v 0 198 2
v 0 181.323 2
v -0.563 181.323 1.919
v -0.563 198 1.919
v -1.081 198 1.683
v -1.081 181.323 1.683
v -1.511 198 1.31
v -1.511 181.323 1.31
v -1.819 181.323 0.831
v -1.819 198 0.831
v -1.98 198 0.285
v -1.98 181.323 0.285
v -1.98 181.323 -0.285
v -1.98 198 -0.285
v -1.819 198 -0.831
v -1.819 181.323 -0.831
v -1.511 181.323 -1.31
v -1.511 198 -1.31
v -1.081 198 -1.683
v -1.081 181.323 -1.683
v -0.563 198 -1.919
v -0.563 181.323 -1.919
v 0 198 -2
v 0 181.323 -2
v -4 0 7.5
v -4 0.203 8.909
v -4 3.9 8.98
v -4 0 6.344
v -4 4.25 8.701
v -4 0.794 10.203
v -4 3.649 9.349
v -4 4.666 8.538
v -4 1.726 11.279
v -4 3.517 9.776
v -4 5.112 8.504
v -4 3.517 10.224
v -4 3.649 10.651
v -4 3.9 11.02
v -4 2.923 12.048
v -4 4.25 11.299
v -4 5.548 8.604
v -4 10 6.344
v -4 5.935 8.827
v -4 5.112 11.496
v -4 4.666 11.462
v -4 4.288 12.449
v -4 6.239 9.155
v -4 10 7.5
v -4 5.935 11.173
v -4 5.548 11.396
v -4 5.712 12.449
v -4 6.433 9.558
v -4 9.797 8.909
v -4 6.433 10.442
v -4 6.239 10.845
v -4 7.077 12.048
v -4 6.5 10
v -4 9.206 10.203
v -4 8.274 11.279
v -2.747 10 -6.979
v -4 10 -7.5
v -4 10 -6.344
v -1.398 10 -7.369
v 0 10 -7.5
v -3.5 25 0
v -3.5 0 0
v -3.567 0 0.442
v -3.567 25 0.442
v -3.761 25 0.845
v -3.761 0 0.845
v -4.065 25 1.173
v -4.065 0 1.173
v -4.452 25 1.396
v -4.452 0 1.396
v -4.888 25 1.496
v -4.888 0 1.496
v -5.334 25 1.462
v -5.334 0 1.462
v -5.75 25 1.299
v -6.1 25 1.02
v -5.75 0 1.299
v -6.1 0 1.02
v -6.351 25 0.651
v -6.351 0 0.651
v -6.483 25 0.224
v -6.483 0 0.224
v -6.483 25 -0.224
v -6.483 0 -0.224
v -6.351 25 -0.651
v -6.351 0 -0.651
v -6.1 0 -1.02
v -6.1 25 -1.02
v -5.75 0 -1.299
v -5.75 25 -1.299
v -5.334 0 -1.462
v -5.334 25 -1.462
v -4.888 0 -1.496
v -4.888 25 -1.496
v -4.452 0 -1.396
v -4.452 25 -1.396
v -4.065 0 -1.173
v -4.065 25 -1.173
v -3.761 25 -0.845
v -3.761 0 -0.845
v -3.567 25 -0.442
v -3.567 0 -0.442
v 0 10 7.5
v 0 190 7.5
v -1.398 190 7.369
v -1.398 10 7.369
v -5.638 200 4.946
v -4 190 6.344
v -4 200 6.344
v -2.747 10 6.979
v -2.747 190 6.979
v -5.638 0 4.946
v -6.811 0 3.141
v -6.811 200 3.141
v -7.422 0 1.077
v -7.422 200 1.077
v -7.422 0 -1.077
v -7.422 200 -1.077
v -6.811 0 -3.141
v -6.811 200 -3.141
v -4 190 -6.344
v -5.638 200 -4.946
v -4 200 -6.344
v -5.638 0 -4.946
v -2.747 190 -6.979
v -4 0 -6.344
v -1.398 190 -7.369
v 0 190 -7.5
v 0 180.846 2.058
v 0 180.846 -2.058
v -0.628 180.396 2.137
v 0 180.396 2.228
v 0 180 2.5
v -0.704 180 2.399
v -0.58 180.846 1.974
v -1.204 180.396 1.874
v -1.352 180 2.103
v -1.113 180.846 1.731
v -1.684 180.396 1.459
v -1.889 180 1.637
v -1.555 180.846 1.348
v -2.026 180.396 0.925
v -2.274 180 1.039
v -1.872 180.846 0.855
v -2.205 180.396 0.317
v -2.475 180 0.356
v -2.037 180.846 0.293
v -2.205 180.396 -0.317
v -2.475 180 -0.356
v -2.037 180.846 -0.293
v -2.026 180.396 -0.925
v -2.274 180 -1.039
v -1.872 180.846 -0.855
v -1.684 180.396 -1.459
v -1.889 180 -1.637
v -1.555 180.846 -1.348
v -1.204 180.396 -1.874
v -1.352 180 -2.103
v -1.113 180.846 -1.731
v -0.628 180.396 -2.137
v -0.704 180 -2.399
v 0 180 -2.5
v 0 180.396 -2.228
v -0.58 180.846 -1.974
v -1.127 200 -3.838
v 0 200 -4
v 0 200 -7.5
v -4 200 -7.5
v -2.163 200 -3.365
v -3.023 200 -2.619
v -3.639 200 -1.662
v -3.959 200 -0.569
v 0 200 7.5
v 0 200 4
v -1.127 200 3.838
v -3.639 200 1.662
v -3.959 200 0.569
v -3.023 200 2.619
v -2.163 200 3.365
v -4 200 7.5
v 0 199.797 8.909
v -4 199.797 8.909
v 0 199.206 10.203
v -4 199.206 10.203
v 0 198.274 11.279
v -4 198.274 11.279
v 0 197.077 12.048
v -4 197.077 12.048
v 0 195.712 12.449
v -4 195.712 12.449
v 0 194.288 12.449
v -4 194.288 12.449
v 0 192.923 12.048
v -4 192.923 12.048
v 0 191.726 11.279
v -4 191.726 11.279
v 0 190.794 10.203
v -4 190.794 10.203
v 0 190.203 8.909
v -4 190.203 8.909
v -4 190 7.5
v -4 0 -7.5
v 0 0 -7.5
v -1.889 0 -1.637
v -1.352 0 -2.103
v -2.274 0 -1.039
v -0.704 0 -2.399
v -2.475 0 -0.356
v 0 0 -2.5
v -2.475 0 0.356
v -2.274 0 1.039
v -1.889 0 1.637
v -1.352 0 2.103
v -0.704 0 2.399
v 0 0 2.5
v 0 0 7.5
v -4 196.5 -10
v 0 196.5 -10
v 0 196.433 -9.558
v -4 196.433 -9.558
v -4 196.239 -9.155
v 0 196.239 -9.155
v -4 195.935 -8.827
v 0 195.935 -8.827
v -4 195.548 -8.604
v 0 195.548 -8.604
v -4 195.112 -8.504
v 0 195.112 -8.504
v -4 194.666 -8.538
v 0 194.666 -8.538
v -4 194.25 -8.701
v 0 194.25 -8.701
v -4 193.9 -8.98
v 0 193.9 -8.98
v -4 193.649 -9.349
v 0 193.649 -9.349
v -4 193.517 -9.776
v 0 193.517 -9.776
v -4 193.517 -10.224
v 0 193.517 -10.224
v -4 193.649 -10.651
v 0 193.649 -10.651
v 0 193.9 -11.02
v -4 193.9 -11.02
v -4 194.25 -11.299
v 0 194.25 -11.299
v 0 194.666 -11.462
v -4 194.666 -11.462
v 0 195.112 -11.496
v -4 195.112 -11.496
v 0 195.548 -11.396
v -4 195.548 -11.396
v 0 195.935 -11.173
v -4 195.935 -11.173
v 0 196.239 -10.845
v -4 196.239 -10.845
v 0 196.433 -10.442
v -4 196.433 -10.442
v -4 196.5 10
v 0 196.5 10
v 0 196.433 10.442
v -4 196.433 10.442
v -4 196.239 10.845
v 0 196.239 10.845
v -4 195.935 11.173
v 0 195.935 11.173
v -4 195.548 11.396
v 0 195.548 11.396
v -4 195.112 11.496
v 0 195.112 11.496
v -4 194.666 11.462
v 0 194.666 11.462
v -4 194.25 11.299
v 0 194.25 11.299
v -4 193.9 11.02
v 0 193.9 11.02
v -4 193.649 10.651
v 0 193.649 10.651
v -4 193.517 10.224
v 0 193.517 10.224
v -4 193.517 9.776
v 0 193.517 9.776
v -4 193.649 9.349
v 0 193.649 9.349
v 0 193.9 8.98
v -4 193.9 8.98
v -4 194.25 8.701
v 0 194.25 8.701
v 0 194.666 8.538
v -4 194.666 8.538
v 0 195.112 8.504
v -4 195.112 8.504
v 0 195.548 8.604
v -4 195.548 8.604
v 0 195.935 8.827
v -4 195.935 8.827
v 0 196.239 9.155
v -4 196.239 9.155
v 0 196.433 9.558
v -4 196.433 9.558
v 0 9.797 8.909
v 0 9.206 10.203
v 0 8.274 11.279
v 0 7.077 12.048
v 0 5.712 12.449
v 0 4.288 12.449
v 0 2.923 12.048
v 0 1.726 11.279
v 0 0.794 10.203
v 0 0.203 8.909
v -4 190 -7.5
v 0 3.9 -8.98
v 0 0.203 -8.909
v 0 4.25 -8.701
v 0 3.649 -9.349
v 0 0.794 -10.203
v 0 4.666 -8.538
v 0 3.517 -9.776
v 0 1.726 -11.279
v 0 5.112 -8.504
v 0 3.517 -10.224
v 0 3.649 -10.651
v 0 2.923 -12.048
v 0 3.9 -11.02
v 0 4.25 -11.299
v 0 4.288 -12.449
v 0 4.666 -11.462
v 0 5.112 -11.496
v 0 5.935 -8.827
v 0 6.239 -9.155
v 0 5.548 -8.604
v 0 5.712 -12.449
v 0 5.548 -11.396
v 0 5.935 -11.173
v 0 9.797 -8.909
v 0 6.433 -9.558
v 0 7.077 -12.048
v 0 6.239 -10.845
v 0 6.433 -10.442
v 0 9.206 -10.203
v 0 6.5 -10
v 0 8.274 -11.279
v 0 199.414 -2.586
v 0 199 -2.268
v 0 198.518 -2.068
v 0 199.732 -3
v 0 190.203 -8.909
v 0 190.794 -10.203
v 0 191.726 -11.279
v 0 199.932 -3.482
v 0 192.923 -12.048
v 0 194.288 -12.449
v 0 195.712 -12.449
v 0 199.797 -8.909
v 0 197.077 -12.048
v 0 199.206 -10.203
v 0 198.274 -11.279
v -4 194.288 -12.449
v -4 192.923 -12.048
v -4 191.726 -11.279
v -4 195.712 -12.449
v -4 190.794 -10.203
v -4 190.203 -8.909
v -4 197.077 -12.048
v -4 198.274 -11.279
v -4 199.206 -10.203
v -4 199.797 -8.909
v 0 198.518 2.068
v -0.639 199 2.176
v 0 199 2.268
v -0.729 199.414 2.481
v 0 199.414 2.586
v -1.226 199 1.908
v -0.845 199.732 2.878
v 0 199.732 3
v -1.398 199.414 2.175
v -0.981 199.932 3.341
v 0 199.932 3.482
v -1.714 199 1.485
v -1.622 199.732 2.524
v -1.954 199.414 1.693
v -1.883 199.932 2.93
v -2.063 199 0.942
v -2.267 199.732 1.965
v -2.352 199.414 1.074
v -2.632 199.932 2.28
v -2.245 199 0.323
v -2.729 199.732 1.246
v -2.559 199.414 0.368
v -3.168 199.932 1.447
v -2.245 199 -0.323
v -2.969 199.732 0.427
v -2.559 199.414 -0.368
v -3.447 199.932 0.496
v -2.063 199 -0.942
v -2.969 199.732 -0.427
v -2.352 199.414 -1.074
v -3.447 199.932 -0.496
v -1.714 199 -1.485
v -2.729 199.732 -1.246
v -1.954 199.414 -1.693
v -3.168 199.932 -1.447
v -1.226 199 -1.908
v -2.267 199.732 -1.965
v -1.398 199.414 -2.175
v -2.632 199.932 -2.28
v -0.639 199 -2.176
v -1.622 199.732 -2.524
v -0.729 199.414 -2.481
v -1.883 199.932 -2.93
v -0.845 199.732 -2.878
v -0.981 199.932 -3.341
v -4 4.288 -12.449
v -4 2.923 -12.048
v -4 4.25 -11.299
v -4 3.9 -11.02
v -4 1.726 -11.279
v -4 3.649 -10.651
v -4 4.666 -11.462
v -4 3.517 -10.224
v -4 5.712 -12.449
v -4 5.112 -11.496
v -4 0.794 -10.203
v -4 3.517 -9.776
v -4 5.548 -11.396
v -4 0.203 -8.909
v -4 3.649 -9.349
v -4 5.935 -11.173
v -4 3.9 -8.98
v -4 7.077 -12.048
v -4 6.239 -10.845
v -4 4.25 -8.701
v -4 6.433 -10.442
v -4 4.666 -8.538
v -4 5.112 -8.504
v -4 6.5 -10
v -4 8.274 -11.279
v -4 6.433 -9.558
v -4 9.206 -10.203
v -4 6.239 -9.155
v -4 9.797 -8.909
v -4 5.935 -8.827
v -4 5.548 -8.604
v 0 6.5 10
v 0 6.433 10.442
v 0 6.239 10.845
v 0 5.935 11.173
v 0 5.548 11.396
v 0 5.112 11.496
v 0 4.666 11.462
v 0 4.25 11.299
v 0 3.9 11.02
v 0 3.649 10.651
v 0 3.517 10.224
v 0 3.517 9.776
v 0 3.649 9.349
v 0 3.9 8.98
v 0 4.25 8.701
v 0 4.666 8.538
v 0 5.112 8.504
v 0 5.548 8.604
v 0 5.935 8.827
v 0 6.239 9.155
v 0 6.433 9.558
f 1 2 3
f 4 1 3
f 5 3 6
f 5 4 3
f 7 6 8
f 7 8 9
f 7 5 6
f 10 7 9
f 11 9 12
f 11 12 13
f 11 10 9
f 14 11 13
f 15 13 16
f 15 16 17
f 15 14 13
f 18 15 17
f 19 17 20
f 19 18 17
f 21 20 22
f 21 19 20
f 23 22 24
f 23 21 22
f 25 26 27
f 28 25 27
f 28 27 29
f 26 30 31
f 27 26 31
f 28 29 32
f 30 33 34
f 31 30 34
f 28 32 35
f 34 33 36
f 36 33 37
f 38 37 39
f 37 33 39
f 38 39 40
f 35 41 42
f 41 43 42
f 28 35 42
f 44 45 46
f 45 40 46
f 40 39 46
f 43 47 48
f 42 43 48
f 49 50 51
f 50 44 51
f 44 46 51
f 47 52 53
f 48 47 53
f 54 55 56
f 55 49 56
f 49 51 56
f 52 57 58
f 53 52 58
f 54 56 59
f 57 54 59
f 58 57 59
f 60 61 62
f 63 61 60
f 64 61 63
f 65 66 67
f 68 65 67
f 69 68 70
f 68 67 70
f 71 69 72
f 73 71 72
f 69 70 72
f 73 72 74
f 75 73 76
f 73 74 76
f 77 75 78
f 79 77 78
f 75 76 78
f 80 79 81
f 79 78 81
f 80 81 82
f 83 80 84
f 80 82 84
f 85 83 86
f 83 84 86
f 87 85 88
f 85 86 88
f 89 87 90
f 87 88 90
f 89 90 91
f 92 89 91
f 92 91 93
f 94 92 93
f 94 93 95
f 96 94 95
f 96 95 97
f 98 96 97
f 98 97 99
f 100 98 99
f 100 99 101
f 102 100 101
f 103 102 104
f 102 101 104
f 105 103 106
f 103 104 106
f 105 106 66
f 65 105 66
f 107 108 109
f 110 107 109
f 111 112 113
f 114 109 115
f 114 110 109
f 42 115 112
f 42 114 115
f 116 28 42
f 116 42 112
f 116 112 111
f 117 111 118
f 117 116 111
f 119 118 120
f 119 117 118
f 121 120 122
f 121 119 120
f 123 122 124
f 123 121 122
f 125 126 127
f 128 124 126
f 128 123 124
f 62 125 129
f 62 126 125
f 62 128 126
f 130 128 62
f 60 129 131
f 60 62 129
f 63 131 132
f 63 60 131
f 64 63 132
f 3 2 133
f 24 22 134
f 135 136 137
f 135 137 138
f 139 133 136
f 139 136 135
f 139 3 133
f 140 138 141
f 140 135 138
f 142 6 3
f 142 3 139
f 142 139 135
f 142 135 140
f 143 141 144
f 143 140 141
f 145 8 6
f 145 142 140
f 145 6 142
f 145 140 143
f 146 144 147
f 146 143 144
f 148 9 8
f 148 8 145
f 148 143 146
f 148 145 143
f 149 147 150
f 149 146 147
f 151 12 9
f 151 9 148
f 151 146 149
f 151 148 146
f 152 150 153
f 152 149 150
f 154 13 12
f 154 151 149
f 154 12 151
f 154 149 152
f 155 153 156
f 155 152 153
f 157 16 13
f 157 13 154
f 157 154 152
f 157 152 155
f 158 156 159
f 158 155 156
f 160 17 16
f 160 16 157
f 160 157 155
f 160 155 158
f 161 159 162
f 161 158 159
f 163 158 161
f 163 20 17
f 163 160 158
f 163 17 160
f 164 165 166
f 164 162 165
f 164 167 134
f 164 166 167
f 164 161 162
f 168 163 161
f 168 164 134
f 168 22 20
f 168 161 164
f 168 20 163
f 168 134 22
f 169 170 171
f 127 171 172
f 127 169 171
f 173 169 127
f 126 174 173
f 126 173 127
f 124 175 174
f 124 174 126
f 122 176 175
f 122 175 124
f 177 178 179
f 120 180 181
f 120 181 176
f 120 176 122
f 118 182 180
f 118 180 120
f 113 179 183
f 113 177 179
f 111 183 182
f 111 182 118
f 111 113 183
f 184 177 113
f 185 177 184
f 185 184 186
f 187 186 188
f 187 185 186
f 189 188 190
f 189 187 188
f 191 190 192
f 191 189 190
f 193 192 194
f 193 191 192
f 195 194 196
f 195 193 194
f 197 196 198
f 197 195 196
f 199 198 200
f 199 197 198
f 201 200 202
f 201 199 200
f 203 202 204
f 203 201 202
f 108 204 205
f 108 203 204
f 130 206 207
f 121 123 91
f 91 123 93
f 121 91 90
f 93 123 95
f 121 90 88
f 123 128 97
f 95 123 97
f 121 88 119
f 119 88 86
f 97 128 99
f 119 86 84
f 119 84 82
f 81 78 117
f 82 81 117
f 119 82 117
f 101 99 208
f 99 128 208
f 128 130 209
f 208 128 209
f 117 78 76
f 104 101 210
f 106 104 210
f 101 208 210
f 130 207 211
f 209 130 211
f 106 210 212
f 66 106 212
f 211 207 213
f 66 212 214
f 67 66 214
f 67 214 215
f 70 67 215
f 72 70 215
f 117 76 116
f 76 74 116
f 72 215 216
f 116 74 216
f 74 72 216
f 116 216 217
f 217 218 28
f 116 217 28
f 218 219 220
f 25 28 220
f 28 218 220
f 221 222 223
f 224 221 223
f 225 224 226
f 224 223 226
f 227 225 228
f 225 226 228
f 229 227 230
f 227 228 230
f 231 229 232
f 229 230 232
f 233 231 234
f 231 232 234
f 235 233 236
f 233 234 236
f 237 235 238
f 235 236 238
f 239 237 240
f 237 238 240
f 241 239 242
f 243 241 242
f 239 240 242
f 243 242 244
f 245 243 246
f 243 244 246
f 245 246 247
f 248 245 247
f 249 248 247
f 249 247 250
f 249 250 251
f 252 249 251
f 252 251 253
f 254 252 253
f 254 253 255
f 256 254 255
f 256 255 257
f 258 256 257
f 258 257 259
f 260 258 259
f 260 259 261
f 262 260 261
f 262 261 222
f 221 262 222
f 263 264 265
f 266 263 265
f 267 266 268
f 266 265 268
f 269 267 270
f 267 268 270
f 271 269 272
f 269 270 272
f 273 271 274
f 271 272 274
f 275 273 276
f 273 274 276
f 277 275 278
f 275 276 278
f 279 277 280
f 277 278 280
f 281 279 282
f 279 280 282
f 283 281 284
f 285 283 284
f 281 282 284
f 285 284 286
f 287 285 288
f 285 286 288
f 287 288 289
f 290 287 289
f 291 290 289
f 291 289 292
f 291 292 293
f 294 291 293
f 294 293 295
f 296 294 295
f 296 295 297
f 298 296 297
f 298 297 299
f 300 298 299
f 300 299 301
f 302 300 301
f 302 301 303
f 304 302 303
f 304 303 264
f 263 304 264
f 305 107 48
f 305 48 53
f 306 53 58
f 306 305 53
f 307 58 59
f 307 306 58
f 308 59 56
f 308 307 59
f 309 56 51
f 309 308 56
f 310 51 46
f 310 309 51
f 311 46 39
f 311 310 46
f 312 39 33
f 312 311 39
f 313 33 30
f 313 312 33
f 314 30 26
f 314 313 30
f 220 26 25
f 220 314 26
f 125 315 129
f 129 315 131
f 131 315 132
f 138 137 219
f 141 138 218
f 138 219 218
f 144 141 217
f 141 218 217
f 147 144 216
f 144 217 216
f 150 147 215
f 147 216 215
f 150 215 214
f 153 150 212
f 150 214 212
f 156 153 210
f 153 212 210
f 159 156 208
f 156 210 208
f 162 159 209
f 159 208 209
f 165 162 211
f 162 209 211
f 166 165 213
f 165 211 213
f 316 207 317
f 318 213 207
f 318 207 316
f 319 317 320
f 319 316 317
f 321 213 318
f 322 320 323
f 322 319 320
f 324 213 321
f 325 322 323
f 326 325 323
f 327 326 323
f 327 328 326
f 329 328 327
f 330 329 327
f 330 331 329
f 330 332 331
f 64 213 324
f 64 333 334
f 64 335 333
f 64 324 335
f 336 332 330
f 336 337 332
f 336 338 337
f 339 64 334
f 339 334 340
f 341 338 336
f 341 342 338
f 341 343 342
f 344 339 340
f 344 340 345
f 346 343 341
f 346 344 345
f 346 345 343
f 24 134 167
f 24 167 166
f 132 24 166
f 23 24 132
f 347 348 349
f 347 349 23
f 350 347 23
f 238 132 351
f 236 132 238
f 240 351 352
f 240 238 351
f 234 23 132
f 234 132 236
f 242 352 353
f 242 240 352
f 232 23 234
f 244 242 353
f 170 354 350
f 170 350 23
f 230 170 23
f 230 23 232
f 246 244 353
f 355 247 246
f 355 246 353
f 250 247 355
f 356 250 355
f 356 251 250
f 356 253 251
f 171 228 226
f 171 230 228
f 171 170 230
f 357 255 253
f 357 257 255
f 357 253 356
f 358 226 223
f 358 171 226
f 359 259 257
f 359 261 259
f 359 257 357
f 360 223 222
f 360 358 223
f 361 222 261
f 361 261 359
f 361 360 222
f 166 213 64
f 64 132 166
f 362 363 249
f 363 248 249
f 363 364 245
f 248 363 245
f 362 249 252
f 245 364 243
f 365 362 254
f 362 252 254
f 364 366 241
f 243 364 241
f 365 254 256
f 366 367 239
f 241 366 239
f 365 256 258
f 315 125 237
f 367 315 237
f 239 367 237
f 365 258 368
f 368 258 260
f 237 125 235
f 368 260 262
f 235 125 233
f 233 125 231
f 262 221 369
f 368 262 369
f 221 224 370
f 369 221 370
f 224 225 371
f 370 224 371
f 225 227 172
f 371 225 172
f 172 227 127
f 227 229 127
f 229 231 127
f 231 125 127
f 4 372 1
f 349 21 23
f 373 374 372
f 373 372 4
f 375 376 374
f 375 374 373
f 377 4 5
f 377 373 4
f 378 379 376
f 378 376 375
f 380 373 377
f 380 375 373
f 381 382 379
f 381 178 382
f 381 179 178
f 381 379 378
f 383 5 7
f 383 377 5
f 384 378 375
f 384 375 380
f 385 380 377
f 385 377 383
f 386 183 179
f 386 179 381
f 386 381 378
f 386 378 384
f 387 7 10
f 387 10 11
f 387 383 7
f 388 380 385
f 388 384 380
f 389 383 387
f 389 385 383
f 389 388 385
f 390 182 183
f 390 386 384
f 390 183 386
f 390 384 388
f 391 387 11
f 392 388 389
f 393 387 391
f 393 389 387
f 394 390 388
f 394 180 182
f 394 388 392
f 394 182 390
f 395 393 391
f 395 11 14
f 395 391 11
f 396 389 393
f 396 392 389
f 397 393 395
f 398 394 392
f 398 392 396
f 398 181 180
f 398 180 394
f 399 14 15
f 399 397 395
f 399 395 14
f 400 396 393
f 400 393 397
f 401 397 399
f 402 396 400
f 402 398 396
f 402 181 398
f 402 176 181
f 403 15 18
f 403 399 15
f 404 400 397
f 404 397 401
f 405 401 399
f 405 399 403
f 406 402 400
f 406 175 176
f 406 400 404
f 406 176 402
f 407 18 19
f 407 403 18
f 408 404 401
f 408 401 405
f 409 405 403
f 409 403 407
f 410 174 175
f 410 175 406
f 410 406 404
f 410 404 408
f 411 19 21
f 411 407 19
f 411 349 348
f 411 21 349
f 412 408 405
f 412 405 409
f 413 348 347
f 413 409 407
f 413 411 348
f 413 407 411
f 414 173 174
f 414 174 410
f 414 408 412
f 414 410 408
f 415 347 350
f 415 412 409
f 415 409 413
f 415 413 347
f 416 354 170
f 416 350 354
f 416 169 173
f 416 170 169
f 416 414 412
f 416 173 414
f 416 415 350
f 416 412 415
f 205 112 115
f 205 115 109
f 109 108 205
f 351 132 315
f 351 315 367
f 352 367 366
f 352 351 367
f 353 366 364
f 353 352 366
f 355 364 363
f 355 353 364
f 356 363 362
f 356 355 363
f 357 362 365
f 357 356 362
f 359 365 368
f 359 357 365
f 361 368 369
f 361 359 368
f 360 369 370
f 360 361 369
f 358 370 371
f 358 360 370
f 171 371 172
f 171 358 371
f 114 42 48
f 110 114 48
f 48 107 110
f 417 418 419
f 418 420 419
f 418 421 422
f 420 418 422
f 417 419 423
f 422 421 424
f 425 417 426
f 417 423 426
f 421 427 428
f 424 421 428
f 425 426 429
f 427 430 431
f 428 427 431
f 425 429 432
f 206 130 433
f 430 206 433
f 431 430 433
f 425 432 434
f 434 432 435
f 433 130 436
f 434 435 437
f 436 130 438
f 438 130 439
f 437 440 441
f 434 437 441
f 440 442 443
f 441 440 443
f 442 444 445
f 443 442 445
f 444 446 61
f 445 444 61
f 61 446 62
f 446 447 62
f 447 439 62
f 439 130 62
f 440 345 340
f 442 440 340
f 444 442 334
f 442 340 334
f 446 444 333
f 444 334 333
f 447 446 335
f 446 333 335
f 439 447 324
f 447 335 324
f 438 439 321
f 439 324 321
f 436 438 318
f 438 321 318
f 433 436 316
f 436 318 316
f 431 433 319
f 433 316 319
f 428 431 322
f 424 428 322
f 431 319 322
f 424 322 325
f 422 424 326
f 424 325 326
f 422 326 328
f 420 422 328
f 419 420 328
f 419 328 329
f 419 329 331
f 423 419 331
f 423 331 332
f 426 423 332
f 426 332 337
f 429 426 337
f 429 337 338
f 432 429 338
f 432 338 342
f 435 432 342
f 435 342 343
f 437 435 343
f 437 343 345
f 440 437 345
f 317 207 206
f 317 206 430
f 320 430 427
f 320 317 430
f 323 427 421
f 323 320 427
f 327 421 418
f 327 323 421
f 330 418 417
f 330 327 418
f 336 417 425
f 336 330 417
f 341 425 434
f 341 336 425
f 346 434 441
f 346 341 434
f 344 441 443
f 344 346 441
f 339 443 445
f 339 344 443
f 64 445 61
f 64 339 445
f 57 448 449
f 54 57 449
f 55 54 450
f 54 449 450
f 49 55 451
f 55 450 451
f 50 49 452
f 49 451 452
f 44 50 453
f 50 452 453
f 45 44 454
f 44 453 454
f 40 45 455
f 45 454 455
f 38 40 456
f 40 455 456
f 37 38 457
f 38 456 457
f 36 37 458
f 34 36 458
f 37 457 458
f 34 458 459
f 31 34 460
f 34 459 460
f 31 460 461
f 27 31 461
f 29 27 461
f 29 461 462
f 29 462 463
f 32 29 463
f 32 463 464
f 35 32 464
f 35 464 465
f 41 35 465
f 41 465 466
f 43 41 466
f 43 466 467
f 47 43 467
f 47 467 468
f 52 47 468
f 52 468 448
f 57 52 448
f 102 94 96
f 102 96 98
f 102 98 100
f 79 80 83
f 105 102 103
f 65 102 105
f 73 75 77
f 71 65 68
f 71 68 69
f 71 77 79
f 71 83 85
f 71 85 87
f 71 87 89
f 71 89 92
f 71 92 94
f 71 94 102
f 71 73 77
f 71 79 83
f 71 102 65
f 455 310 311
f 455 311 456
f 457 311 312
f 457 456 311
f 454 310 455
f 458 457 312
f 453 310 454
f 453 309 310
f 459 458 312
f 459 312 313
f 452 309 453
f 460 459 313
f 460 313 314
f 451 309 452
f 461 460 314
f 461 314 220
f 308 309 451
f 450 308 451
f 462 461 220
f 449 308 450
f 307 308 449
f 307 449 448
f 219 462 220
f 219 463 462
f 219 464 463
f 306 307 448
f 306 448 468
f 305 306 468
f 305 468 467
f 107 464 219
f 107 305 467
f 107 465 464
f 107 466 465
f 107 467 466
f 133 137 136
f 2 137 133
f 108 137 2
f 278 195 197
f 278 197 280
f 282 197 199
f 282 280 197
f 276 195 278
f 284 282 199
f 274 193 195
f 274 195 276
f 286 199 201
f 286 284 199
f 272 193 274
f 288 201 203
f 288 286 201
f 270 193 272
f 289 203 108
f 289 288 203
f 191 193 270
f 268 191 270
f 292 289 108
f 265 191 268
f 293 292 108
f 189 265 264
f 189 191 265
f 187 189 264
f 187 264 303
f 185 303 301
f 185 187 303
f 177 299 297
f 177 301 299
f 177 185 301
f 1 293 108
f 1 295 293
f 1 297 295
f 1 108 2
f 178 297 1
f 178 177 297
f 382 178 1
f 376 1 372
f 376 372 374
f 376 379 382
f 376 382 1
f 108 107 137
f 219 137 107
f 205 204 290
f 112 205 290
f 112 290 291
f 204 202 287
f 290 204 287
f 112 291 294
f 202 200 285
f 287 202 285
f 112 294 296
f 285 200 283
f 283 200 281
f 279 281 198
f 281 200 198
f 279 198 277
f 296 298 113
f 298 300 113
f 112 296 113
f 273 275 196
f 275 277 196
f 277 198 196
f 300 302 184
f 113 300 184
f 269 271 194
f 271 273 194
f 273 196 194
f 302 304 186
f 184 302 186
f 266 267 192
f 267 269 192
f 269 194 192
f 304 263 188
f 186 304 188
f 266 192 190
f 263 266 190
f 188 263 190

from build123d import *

# Parameters (mm, degrees)
F0_R         = 7.5
F0_R_2       = 2.5
F1_DEPTH     = 200
F2_R         = 1.5
F3_DEPTH     = 25
F4_W         = 255.6320726871
F4_H         = 34.7503256053
F5_DEPTH     = 25
F6_W         = 10
F6_H         = 5
F6_H_2       = 4.8793365061
F7_DEPTH     = 4
F8_R         = 1.5
F9_DEPTH     = 7.501
F11_DEPTH    = 20
F12_T2_ANGLE = 359.64
F12_T4_ANGLE = 359.64


# Not quite as in the source:
# - a fillet or chamfer that OpenCascade refuses, or shapes differently, is made with other operations: its cross-section is extruded or revolved along the edge and cut away or added


with BuildPart() as f1:
    # F0 (on Front) → F1 (new body)
    with BuildSketch(Plane.XZ):
        Circle(F0_R)
        Circle(F0_R_2, mode=Mode.SUBTRACT)
    extrude(amount=-F1_DEPTH)

    # F2 (on face) → F3 (cut)
    with BuildSketch(Plane.XZ):
        with Locations((5, 0)):
            Circle(F2_R)
        with Locations((-5, 0)):
            Circle(F2_R)
    extrude(amount=-F3_DEPTH, mode=Mode.SUBTRACT)

    # F4 (on Right) → F5 (cut)
    with BuildSketch(Plane.YZ):
        with Locations((127.8160363436, -0.9753750637)):
            Rectangle(F4_W, F4_H)
    extrude(amount=F5_DEPTH, mode=Mode.SUBTRACT)

    # F6 (on face) → F7 (join)
    with BuildSketch(Plane.YZ):
        with BuildLine():
            ThreePointArc((10, 7.5), (5, 12.5), (0, 7.5))
            Line((0, 7.5), (10, 7.5))
        make_face()
        with Locations((5, 5)):
            Rectangle(F6_W, F6_H)
        with BuildLine():
            Line((190, 7.5), (200, 7.5))
            ThreePointArc((200, 7.5), (195, 12.5), (190, 7.5))
        make_face()
        with Locations((195, 5)):
            Rectangle(F6_W, F6_H)
        with BuildLine():
            ThreePointArc((190, -7.5), (195, -12.5), (200, -7.5))
            Line((200, -7.5), (190, -7.5))
        make_face()
        with Locations((195, -5.0603317469)):
            Rectangle(F6_W, F6_H_2)
        with BuildLine():
            Line((10, -7.5), (0, -7.5))
            ThreePointArc((0, -7.5), (5, -12.5), (10, -7.5))
        make_face()
        with Locations((5, -5.0603317469)):
            Rectangle(F6_W, F6_H_2)
    extrude(amount=-F7_DEPTH)

    # F8 (on face) → F9 (cut, through all)
    with BuildSketch(Plane.YZ):
        with Locations((5, 10)):
            Circle(F8_R)
        with Locations((5, -10)):
            Circle(F8_R)
        with Locations((195, 10)):
            Circle(F8_R)
        with Locations((195, -10)):
            Circle(F8_R)
    extrude(amount=-F9_DEPTH, mode=Mode.SUBTRACT)

    # F10 (on face) → F11 (join)
    with BuildSketch(Plane(origin=(0, 200, 0), x_dir=(-1, 0, 0), z_dir=(0, 1, 0))):
        with BuildLine():
            ThreePointArc((0, 2), (2, 0), (0, -2))
            Line((0, -2), (0, -2.5))
            ThreePointArc((0, -2.5), (2.5, 0), (0, 2.5))
            Line((0, 2.5), (0, 2))
        make_face()
    extrude(amount=-F11_DEPTH)

    # F12: fillet of radius 2 on 2 edges, made by hand

    # F12_s1 → F12_t2 (revolve, cut)
    with BuildSketch(Plane(origin=(0, 0, 0), x_dir=(0, 1, 0), z_dir=(0.0031415875, 0, -0.9999950652))):
        with BuildLine():
            ThreePointArc((180, 2.5), (180.6157688743, 2.1291713066), (181.3228756555, 2))
            Line((181.3228756555, 2), (180, 2))
            Line((180, 2), (180, 2.5))
        make_face()
    revolve(axis=Axis((0, 180, 0), (0, -1, 0)), revolution_arc=F12_T2_ANGLE, mode=Mode.SUBTRACT)

    # F12_s3 → F12_t4 (revolve, cut)
    with BuildSketch(Plane(origin=(0, 0, 0), x_dir=(0, 1, 0), z_dir=(0.0031415875, 0, -0.9999950652))):
        with BuildLine():
            ThreePointArc((198, 2), (199.4142135624, 2.5857864376), (200, 4))
            Line((200, 4), (200, 2))
            Line((200, 2), (198, 2))
        make_face()
    revolve(axis=Axis((0, 200, 0), (0, -1, 0)), revolution_arc=F12_T4_ANGLE, mode=Mode.SUBTRACT)


solid = f1.part
